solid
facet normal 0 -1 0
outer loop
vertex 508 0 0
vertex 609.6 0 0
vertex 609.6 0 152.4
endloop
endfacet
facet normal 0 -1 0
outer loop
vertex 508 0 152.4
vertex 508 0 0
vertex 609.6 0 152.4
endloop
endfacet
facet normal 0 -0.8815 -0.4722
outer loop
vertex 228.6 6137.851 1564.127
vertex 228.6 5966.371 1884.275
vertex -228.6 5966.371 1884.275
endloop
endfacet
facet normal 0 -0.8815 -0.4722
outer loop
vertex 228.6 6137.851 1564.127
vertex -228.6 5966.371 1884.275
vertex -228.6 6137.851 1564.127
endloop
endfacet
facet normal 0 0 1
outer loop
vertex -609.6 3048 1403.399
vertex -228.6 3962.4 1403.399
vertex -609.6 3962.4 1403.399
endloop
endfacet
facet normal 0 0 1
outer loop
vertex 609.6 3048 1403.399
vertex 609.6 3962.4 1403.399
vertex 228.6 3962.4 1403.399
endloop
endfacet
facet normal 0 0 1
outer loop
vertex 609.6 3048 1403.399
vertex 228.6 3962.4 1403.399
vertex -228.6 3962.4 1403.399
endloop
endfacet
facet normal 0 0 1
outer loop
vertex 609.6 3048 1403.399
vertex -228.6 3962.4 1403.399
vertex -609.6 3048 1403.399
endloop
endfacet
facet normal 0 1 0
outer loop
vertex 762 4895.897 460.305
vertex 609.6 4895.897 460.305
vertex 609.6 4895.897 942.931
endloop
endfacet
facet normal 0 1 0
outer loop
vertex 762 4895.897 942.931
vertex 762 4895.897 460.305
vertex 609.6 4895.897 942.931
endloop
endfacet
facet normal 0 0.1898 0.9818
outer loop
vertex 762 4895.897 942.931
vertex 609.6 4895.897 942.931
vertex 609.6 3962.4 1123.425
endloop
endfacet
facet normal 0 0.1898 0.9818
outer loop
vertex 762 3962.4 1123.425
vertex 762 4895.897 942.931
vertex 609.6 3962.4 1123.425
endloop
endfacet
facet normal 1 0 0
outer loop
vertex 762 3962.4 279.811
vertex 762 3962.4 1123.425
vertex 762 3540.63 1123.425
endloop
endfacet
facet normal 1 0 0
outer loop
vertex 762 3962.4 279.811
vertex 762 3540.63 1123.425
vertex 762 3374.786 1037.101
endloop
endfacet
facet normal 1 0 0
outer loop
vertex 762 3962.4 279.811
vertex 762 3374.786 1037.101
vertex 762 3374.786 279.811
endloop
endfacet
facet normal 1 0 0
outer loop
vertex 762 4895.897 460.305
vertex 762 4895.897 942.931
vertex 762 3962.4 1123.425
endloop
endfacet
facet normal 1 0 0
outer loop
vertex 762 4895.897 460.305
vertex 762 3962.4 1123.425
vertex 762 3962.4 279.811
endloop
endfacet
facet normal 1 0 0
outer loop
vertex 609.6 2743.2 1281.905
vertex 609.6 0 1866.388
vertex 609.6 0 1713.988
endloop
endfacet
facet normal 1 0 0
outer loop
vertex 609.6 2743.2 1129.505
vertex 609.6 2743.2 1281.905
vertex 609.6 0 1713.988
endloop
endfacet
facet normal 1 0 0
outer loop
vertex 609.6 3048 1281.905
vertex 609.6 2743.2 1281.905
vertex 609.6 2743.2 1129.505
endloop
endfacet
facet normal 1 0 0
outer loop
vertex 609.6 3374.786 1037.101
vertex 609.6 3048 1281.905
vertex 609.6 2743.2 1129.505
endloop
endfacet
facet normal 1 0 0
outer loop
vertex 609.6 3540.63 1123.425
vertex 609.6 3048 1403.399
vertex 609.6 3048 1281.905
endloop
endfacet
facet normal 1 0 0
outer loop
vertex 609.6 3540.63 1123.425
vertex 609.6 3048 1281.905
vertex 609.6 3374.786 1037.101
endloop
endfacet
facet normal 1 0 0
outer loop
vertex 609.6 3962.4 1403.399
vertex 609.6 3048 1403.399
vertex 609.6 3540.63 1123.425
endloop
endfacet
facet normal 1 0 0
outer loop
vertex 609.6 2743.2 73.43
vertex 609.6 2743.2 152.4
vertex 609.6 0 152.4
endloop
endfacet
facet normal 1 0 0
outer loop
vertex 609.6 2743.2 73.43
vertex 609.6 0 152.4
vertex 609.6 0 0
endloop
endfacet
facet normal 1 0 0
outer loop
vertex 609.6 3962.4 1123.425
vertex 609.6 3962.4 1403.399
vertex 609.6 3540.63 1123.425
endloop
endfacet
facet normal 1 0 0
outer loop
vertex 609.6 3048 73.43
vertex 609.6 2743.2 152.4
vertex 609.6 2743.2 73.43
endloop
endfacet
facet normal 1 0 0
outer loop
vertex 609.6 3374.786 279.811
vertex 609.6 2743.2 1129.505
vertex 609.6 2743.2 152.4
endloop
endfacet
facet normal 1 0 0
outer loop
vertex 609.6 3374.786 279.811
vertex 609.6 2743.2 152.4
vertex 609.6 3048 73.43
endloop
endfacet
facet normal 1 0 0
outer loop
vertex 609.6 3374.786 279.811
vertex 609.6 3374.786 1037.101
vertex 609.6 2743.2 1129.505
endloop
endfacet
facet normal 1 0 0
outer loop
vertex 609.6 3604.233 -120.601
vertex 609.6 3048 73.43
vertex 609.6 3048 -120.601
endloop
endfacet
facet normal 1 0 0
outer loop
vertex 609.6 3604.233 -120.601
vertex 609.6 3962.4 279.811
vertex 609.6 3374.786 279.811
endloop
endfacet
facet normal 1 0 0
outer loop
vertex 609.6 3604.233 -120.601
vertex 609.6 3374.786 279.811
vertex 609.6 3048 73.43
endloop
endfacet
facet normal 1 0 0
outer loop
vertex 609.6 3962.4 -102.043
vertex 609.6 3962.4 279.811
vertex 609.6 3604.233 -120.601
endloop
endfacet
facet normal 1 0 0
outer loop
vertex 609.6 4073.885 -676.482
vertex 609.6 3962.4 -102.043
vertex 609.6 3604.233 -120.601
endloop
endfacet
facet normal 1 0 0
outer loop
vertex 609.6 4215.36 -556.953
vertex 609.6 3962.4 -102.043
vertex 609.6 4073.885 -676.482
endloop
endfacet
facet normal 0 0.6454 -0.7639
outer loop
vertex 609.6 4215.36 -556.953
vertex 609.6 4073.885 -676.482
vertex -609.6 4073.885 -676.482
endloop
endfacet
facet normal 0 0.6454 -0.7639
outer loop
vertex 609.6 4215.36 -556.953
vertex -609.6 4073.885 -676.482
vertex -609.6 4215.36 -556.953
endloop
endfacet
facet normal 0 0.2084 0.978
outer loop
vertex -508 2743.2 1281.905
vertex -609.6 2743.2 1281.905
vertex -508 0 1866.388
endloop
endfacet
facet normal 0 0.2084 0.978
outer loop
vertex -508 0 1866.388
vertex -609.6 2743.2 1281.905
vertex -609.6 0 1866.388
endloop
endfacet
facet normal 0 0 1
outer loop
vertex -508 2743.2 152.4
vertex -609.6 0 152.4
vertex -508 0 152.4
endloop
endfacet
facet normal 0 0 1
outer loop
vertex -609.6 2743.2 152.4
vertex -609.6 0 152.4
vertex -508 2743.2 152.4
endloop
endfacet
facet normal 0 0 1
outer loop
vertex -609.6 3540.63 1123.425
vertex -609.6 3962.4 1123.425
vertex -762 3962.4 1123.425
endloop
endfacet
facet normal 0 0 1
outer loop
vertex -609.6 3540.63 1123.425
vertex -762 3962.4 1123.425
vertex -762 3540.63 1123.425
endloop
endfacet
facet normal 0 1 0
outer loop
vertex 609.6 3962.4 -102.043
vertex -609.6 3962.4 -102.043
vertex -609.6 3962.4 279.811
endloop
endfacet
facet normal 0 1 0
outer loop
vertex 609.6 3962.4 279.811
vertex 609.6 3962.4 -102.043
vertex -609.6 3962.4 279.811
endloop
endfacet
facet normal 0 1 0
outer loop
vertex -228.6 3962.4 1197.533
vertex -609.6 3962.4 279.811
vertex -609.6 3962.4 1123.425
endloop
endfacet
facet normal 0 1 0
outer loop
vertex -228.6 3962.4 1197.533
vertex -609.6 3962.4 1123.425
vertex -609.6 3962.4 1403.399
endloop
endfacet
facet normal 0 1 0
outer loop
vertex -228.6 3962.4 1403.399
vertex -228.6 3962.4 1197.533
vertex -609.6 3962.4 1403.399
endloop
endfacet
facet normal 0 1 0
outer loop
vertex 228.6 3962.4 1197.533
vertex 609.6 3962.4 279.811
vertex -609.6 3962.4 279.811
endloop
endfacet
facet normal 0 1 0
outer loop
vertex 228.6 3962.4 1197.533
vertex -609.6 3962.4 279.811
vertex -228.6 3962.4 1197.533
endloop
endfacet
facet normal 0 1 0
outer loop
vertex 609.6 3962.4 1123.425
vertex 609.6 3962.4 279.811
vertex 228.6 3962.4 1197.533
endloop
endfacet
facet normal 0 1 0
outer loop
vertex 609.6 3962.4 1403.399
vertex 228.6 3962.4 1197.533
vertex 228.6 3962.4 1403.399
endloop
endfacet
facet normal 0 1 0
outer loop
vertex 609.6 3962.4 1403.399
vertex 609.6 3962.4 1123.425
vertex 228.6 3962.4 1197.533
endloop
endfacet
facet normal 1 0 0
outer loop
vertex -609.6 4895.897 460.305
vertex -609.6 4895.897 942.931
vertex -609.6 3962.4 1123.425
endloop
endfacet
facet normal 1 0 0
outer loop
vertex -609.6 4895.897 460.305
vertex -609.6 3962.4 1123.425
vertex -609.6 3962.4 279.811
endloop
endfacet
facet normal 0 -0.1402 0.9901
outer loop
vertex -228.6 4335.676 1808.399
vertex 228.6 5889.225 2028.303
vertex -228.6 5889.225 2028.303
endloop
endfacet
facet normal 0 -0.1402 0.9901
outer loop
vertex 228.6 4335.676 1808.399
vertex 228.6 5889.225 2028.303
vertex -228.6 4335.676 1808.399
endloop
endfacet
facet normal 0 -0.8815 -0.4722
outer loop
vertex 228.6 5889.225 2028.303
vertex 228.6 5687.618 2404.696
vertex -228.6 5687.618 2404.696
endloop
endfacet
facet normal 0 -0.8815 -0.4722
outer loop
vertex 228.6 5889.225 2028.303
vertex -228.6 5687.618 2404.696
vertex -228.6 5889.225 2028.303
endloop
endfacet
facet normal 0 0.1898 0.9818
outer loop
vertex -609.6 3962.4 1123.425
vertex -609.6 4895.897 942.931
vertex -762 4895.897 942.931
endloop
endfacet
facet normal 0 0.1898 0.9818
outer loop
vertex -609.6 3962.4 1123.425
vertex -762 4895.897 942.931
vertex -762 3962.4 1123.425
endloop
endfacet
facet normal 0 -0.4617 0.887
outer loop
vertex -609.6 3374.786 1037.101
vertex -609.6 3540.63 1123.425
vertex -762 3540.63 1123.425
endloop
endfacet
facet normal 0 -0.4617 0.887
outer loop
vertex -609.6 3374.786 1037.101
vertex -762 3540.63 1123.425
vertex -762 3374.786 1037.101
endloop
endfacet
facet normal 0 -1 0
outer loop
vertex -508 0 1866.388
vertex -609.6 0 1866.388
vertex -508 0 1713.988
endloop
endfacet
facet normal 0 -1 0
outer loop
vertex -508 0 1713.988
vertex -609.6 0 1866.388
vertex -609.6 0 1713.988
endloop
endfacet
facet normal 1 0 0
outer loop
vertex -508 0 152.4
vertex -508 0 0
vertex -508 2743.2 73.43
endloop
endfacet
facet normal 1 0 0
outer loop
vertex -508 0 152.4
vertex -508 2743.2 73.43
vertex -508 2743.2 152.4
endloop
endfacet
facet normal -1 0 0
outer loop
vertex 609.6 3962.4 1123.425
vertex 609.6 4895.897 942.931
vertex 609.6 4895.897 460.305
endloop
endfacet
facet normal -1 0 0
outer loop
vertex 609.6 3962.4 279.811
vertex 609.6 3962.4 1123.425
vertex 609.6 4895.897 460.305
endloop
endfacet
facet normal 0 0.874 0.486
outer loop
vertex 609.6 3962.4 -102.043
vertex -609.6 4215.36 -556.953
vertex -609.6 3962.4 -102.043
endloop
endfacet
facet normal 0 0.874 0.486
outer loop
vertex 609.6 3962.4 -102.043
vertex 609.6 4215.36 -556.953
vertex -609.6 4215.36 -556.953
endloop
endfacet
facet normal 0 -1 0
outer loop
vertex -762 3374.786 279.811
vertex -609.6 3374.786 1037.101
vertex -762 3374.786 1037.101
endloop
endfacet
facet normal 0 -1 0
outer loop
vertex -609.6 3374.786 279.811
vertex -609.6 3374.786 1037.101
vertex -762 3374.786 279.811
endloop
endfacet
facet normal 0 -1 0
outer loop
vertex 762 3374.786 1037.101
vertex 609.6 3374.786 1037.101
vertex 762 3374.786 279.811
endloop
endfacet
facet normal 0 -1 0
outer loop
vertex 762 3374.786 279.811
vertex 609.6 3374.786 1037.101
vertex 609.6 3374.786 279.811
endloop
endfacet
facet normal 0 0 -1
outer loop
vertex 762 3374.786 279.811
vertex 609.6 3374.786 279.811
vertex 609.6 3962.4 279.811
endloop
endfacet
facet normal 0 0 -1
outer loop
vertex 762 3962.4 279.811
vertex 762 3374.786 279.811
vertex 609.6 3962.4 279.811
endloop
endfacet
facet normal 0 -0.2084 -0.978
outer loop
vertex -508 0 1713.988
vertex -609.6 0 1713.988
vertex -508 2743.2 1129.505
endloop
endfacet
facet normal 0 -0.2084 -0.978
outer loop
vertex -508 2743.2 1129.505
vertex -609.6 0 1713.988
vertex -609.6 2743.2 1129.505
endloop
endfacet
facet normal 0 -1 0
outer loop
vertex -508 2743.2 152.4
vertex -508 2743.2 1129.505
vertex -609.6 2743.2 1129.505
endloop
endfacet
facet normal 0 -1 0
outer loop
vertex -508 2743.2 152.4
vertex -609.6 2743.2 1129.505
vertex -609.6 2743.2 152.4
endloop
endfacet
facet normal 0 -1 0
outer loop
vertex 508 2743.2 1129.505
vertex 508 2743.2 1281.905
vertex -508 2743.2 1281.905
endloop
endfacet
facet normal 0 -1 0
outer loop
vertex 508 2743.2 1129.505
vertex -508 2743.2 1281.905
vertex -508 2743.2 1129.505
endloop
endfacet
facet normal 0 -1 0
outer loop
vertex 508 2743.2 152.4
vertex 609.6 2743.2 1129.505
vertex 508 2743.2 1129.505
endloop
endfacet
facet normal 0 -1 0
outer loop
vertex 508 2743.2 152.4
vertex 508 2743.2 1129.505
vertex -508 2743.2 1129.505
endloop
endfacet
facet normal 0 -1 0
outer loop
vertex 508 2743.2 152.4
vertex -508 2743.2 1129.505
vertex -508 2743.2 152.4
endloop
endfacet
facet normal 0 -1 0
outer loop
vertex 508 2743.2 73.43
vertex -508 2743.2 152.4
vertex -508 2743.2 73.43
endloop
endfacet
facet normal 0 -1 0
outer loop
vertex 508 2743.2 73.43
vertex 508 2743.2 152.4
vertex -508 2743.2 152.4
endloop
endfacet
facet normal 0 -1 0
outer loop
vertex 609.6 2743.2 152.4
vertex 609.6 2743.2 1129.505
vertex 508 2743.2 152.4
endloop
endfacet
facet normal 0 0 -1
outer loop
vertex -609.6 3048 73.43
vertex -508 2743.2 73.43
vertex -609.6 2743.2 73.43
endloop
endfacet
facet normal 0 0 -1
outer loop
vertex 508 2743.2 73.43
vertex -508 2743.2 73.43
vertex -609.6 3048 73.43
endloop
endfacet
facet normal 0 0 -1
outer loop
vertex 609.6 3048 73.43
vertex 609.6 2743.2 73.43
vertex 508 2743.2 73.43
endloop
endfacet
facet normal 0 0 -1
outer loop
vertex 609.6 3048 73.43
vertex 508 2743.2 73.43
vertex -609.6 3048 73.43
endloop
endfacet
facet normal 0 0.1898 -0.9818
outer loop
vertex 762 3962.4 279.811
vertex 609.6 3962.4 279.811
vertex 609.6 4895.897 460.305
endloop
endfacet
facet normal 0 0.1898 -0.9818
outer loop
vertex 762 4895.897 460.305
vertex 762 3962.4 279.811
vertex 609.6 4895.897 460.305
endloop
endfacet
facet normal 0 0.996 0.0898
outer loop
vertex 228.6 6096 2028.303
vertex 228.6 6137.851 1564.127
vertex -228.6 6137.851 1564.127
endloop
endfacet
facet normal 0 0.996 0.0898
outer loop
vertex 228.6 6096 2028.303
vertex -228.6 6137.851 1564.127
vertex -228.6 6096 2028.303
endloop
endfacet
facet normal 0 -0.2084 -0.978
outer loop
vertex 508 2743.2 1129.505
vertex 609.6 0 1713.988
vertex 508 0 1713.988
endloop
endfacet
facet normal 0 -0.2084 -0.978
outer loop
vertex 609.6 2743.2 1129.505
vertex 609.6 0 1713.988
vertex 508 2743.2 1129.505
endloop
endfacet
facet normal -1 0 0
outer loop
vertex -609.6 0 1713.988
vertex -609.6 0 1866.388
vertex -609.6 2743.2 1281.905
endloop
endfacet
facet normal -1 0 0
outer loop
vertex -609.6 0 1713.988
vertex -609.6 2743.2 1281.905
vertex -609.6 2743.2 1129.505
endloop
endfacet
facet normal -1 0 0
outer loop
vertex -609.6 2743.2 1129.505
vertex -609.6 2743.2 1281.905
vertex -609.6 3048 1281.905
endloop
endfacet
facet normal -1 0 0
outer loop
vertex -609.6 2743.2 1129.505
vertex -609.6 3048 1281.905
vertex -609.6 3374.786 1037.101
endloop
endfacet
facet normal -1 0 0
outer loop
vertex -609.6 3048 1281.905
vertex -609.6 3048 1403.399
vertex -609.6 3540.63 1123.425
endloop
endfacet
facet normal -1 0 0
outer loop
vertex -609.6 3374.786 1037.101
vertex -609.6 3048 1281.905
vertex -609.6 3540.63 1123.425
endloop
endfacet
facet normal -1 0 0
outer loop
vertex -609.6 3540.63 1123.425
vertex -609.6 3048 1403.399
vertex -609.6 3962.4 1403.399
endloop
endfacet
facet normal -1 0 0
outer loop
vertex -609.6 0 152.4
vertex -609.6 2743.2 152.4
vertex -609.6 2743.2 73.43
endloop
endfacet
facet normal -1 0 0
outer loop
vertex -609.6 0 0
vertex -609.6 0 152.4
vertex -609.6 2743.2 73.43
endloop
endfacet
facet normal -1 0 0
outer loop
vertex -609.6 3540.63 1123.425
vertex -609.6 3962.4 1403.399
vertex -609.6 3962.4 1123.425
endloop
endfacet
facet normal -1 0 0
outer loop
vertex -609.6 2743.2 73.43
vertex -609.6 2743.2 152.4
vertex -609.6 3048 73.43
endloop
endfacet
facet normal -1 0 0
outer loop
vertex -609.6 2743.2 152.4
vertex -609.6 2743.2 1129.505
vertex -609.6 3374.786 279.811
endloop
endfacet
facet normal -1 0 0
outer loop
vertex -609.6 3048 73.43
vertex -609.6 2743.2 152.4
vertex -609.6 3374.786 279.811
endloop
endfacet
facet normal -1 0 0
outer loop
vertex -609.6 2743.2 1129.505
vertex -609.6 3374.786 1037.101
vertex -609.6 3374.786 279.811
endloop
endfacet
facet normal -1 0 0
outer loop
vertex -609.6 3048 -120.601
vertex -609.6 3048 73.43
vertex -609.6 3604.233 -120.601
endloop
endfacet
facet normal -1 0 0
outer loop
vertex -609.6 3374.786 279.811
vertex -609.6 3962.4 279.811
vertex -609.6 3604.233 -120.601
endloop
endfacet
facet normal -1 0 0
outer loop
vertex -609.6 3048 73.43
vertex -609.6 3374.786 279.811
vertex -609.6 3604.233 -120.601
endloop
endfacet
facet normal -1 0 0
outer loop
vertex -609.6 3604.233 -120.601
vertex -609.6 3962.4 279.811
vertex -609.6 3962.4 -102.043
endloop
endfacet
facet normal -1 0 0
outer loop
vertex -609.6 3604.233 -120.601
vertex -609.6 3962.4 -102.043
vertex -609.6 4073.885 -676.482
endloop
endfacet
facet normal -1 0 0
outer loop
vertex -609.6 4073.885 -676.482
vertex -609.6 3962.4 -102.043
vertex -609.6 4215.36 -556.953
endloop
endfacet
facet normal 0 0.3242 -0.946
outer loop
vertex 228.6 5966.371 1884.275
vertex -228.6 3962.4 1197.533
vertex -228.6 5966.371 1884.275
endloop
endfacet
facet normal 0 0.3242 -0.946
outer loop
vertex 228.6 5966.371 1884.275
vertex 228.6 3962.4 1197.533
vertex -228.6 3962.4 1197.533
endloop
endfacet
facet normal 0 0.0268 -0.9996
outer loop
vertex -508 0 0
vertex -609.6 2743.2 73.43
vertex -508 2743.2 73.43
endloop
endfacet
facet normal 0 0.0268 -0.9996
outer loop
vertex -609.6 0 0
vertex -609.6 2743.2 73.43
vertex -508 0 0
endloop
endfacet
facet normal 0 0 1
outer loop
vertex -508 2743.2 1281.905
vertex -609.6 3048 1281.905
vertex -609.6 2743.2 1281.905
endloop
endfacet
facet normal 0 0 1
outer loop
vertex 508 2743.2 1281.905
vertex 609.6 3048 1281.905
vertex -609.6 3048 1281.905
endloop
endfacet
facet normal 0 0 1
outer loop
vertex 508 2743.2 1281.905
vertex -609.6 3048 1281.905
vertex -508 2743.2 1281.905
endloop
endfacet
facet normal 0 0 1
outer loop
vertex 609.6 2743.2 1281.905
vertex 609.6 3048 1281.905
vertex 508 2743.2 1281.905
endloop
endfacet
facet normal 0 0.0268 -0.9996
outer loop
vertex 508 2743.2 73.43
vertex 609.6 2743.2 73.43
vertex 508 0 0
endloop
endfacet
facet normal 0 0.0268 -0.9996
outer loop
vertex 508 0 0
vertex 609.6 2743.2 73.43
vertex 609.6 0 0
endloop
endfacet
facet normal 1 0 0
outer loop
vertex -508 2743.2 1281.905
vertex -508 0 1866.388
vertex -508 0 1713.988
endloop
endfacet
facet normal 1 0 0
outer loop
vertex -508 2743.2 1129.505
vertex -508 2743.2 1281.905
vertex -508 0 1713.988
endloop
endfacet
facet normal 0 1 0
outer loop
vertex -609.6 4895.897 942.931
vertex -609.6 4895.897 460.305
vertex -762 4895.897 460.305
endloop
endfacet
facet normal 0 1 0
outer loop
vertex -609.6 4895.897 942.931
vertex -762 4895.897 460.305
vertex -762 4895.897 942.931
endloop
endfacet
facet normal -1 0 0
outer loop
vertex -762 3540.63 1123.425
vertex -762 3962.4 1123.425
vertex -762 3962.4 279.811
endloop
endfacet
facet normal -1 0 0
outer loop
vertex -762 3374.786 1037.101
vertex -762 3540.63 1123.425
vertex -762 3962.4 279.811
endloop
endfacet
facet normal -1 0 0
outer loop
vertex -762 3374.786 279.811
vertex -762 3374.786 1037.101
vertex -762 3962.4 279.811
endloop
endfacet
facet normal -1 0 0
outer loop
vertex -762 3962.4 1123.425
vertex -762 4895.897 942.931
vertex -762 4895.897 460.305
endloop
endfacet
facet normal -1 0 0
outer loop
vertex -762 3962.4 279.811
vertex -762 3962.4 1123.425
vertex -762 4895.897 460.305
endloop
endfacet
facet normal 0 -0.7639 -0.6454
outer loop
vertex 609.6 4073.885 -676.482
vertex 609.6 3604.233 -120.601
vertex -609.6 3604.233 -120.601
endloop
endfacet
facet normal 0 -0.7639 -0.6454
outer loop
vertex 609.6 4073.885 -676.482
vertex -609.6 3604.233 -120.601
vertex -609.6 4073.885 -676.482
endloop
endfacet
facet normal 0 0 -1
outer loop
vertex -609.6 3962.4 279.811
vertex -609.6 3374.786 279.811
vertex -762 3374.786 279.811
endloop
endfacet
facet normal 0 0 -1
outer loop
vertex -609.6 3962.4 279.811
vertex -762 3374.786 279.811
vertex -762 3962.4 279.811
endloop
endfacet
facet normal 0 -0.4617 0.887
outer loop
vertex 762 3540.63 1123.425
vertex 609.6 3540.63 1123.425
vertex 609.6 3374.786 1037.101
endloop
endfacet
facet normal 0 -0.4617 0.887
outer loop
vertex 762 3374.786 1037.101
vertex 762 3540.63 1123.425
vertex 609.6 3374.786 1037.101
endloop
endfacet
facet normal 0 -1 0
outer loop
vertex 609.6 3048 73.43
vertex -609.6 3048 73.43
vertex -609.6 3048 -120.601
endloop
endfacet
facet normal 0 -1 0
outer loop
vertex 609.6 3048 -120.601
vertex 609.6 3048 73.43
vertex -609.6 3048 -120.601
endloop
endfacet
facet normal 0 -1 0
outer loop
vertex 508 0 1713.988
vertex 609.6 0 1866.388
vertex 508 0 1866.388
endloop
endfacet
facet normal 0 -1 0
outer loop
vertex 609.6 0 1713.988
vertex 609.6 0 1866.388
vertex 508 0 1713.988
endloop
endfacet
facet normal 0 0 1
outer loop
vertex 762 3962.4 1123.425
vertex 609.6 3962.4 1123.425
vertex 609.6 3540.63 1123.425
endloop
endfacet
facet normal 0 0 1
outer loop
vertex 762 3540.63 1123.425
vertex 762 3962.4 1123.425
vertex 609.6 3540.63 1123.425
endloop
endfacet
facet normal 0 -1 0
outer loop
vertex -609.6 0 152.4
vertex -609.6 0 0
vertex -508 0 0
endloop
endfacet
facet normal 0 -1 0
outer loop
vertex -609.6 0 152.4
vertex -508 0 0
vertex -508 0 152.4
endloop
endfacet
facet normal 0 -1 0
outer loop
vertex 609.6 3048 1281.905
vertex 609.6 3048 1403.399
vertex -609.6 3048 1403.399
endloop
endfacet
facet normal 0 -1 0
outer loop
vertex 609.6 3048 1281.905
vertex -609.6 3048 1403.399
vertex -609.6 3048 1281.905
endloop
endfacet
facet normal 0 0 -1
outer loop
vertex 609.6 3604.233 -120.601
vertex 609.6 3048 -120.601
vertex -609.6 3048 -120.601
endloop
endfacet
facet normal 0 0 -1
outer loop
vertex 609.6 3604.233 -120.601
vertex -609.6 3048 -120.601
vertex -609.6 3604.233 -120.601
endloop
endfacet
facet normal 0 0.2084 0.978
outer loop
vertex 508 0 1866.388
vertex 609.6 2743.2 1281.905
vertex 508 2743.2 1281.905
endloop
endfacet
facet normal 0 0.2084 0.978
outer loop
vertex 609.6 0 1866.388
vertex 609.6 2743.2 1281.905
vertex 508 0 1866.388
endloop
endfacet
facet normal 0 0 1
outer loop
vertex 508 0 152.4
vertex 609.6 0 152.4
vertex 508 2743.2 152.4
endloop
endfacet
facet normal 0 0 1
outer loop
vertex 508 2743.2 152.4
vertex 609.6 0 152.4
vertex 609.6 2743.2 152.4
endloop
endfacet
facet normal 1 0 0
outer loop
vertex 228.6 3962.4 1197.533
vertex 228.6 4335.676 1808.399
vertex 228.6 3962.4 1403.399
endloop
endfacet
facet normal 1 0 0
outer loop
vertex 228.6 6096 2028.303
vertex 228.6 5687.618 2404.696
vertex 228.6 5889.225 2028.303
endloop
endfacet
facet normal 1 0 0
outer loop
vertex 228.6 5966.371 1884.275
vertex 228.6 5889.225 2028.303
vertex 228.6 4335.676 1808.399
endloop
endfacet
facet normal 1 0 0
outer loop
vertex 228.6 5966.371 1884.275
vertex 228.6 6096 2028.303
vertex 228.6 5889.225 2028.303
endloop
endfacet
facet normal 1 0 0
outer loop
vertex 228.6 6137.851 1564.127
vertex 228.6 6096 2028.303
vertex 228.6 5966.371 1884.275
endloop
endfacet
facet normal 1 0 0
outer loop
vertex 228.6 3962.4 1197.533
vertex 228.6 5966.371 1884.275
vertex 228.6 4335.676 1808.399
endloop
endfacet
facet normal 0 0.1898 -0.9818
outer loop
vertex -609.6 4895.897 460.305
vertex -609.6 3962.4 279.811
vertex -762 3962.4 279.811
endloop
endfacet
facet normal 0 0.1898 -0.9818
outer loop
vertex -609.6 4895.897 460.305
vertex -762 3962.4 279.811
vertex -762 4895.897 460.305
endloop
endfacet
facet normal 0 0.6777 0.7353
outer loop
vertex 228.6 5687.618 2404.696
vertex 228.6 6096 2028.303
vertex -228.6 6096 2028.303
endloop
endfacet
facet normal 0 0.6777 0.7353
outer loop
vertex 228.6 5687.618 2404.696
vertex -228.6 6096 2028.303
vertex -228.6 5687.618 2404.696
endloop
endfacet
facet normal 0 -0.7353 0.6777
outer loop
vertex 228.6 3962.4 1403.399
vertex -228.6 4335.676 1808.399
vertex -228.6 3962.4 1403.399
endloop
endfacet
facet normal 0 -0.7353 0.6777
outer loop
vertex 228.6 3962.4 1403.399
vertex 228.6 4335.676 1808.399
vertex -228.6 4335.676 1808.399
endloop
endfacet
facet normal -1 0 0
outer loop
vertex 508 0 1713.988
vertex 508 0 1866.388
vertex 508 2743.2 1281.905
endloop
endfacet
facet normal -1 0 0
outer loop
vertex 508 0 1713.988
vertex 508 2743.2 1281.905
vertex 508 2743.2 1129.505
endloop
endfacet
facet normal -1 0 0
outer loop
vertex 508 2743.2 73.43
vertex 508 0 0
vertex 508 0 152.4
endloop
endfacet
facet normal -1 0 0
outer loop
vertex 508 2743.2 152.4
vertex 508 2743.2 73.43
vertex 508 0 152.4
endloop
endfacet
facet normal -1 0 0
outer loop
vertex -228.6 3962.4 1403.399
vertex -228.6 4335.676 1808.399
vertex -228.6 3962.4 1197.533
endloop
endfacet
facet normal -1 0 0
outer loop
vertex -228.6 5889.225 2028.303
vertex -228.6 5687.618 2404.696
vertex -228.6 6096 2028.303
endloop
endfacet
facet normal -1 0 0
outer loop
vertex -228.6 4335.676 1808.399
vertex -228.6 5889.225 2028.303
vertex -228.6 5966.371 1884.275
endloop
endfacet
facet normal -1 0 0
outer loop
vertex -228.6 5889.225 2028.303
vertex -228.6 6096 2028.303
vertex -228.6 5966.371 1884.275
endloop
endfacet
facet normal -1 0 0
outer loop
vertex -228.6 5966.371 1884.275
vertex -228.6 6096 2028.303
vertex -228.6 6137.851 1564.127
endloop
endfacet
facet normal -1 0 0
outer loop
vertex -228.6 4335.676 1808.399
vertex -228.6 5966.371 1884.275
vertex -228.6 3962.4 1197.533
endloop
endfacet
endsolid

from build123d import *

# Parameters (mm, degrees)
BOSS_EXTRUDE1_DEPTH = 609.6
BOSS_EXTRUDE2_DEPTH = 228.6
BOSS_EXTRUDE3_DEPTH = 101.6
BOSS_EXTRUDE4_DEPTH = 152.4


with BuildPart() as part:
    # Sketch3 → Boss-Extrude1 (new, symmetric)
    with BuildSketch(Plane(origin=(0, 0, 0), x_dir=(0, 0, -1), z_dir=(1, 0, 0))):
        Polygon((-1403.399147583, 3962.4), (-1403.399147583, 3048), (-1281.905205668, 3048), (-1281.905205668, 2743.2), (-73.429907916, 2743.2), (-73.429907916, 3048), (120.600852417, 3048), (120.600852417, 3604.233447538), (676.481992438, 4073.884902835), (556.952807671, 4215.360072867), (102.042755684, 3962.4), align=None)
    extrude(amount=BOSS_EXTRUDE1_DEPTH, both=True)

    # Sketch4 → Boss-Extrude2 (add, symmetric)
    with BuildSketch(Plane(origin=(0, 0, 0), x_dir=(0, 0, -1), z_dir=(1, 0, 0))):
        Polygon((-1197.532980631, 3962.4), (-1884.274712895, 5966.37050229), (-1564.126997016, 6137.850814454), (-2028.302691776, 6096), (-2404.695882916, 5687.617975671), (-2028.302691776, 5889.224979914), (-1808.399476915, 4335.676386542), (-1403.399147583, 3962.4), align=None)
    extrude(amount=BOSS_EXTRUDE2_DEPTH, both=True)

    # Sketch5 → Boss-Extrude3 (add)
    with BuildSketch(Plane(origin=(609.6, 0, 0), x_dir=(0, 0, -1), z_dir=(1, 0, 0))):
        Polygon((-1281.905205668, 2743.2), (-1866.388393206, 0), (-1713.988393206, 0), (-1129.505205668, 2743.2), align=None)
        Polygon((-73.429907916, 2743.2), (0, 0), (-152.4, 0), (-152.4, 2743.2), align=None)
    boss_extrude3 = extrude(amount=-BOSS_EXTRUDE3_DEPTH)

    # Mirror1: Boss-Extrude3 across plane
    add(boss_extrude3.mirror(Plane(origin=(0, 0, 0), x_dir=(0, 0, 1), z_dir=(1, 0, 0))))

    # Sketch6 → Boss-Extrude4 (add)
    with BuildSketch(Plane(origin=(609.6, 0, 0), x_dir=(0, 0, -1), z_dir=(1, 0, 0))):
        Polygon((-942.930548368, 4895.897444272), (-1123.424597624, 3962.4), (-1123.424597624, 3540.629752292), (-1037.101356676, 3374.786165086), (-279.811106534, 3374.786165086), (-279.811106534, 3962.4), (-460.305155791, 4895.897444272), align=None)
    boss_extrude4 = extrude(amount=BOSS_EXTRUDE4_DEPTH)

    # Mirror2: Boss-Extrude4 across plane
    add(boss_extrude4.mirror(Plane(origin=(0, 0, 0), x_dir=(0, 0, 1), z_dir=(1, 0, 0))))


solid = part.part
